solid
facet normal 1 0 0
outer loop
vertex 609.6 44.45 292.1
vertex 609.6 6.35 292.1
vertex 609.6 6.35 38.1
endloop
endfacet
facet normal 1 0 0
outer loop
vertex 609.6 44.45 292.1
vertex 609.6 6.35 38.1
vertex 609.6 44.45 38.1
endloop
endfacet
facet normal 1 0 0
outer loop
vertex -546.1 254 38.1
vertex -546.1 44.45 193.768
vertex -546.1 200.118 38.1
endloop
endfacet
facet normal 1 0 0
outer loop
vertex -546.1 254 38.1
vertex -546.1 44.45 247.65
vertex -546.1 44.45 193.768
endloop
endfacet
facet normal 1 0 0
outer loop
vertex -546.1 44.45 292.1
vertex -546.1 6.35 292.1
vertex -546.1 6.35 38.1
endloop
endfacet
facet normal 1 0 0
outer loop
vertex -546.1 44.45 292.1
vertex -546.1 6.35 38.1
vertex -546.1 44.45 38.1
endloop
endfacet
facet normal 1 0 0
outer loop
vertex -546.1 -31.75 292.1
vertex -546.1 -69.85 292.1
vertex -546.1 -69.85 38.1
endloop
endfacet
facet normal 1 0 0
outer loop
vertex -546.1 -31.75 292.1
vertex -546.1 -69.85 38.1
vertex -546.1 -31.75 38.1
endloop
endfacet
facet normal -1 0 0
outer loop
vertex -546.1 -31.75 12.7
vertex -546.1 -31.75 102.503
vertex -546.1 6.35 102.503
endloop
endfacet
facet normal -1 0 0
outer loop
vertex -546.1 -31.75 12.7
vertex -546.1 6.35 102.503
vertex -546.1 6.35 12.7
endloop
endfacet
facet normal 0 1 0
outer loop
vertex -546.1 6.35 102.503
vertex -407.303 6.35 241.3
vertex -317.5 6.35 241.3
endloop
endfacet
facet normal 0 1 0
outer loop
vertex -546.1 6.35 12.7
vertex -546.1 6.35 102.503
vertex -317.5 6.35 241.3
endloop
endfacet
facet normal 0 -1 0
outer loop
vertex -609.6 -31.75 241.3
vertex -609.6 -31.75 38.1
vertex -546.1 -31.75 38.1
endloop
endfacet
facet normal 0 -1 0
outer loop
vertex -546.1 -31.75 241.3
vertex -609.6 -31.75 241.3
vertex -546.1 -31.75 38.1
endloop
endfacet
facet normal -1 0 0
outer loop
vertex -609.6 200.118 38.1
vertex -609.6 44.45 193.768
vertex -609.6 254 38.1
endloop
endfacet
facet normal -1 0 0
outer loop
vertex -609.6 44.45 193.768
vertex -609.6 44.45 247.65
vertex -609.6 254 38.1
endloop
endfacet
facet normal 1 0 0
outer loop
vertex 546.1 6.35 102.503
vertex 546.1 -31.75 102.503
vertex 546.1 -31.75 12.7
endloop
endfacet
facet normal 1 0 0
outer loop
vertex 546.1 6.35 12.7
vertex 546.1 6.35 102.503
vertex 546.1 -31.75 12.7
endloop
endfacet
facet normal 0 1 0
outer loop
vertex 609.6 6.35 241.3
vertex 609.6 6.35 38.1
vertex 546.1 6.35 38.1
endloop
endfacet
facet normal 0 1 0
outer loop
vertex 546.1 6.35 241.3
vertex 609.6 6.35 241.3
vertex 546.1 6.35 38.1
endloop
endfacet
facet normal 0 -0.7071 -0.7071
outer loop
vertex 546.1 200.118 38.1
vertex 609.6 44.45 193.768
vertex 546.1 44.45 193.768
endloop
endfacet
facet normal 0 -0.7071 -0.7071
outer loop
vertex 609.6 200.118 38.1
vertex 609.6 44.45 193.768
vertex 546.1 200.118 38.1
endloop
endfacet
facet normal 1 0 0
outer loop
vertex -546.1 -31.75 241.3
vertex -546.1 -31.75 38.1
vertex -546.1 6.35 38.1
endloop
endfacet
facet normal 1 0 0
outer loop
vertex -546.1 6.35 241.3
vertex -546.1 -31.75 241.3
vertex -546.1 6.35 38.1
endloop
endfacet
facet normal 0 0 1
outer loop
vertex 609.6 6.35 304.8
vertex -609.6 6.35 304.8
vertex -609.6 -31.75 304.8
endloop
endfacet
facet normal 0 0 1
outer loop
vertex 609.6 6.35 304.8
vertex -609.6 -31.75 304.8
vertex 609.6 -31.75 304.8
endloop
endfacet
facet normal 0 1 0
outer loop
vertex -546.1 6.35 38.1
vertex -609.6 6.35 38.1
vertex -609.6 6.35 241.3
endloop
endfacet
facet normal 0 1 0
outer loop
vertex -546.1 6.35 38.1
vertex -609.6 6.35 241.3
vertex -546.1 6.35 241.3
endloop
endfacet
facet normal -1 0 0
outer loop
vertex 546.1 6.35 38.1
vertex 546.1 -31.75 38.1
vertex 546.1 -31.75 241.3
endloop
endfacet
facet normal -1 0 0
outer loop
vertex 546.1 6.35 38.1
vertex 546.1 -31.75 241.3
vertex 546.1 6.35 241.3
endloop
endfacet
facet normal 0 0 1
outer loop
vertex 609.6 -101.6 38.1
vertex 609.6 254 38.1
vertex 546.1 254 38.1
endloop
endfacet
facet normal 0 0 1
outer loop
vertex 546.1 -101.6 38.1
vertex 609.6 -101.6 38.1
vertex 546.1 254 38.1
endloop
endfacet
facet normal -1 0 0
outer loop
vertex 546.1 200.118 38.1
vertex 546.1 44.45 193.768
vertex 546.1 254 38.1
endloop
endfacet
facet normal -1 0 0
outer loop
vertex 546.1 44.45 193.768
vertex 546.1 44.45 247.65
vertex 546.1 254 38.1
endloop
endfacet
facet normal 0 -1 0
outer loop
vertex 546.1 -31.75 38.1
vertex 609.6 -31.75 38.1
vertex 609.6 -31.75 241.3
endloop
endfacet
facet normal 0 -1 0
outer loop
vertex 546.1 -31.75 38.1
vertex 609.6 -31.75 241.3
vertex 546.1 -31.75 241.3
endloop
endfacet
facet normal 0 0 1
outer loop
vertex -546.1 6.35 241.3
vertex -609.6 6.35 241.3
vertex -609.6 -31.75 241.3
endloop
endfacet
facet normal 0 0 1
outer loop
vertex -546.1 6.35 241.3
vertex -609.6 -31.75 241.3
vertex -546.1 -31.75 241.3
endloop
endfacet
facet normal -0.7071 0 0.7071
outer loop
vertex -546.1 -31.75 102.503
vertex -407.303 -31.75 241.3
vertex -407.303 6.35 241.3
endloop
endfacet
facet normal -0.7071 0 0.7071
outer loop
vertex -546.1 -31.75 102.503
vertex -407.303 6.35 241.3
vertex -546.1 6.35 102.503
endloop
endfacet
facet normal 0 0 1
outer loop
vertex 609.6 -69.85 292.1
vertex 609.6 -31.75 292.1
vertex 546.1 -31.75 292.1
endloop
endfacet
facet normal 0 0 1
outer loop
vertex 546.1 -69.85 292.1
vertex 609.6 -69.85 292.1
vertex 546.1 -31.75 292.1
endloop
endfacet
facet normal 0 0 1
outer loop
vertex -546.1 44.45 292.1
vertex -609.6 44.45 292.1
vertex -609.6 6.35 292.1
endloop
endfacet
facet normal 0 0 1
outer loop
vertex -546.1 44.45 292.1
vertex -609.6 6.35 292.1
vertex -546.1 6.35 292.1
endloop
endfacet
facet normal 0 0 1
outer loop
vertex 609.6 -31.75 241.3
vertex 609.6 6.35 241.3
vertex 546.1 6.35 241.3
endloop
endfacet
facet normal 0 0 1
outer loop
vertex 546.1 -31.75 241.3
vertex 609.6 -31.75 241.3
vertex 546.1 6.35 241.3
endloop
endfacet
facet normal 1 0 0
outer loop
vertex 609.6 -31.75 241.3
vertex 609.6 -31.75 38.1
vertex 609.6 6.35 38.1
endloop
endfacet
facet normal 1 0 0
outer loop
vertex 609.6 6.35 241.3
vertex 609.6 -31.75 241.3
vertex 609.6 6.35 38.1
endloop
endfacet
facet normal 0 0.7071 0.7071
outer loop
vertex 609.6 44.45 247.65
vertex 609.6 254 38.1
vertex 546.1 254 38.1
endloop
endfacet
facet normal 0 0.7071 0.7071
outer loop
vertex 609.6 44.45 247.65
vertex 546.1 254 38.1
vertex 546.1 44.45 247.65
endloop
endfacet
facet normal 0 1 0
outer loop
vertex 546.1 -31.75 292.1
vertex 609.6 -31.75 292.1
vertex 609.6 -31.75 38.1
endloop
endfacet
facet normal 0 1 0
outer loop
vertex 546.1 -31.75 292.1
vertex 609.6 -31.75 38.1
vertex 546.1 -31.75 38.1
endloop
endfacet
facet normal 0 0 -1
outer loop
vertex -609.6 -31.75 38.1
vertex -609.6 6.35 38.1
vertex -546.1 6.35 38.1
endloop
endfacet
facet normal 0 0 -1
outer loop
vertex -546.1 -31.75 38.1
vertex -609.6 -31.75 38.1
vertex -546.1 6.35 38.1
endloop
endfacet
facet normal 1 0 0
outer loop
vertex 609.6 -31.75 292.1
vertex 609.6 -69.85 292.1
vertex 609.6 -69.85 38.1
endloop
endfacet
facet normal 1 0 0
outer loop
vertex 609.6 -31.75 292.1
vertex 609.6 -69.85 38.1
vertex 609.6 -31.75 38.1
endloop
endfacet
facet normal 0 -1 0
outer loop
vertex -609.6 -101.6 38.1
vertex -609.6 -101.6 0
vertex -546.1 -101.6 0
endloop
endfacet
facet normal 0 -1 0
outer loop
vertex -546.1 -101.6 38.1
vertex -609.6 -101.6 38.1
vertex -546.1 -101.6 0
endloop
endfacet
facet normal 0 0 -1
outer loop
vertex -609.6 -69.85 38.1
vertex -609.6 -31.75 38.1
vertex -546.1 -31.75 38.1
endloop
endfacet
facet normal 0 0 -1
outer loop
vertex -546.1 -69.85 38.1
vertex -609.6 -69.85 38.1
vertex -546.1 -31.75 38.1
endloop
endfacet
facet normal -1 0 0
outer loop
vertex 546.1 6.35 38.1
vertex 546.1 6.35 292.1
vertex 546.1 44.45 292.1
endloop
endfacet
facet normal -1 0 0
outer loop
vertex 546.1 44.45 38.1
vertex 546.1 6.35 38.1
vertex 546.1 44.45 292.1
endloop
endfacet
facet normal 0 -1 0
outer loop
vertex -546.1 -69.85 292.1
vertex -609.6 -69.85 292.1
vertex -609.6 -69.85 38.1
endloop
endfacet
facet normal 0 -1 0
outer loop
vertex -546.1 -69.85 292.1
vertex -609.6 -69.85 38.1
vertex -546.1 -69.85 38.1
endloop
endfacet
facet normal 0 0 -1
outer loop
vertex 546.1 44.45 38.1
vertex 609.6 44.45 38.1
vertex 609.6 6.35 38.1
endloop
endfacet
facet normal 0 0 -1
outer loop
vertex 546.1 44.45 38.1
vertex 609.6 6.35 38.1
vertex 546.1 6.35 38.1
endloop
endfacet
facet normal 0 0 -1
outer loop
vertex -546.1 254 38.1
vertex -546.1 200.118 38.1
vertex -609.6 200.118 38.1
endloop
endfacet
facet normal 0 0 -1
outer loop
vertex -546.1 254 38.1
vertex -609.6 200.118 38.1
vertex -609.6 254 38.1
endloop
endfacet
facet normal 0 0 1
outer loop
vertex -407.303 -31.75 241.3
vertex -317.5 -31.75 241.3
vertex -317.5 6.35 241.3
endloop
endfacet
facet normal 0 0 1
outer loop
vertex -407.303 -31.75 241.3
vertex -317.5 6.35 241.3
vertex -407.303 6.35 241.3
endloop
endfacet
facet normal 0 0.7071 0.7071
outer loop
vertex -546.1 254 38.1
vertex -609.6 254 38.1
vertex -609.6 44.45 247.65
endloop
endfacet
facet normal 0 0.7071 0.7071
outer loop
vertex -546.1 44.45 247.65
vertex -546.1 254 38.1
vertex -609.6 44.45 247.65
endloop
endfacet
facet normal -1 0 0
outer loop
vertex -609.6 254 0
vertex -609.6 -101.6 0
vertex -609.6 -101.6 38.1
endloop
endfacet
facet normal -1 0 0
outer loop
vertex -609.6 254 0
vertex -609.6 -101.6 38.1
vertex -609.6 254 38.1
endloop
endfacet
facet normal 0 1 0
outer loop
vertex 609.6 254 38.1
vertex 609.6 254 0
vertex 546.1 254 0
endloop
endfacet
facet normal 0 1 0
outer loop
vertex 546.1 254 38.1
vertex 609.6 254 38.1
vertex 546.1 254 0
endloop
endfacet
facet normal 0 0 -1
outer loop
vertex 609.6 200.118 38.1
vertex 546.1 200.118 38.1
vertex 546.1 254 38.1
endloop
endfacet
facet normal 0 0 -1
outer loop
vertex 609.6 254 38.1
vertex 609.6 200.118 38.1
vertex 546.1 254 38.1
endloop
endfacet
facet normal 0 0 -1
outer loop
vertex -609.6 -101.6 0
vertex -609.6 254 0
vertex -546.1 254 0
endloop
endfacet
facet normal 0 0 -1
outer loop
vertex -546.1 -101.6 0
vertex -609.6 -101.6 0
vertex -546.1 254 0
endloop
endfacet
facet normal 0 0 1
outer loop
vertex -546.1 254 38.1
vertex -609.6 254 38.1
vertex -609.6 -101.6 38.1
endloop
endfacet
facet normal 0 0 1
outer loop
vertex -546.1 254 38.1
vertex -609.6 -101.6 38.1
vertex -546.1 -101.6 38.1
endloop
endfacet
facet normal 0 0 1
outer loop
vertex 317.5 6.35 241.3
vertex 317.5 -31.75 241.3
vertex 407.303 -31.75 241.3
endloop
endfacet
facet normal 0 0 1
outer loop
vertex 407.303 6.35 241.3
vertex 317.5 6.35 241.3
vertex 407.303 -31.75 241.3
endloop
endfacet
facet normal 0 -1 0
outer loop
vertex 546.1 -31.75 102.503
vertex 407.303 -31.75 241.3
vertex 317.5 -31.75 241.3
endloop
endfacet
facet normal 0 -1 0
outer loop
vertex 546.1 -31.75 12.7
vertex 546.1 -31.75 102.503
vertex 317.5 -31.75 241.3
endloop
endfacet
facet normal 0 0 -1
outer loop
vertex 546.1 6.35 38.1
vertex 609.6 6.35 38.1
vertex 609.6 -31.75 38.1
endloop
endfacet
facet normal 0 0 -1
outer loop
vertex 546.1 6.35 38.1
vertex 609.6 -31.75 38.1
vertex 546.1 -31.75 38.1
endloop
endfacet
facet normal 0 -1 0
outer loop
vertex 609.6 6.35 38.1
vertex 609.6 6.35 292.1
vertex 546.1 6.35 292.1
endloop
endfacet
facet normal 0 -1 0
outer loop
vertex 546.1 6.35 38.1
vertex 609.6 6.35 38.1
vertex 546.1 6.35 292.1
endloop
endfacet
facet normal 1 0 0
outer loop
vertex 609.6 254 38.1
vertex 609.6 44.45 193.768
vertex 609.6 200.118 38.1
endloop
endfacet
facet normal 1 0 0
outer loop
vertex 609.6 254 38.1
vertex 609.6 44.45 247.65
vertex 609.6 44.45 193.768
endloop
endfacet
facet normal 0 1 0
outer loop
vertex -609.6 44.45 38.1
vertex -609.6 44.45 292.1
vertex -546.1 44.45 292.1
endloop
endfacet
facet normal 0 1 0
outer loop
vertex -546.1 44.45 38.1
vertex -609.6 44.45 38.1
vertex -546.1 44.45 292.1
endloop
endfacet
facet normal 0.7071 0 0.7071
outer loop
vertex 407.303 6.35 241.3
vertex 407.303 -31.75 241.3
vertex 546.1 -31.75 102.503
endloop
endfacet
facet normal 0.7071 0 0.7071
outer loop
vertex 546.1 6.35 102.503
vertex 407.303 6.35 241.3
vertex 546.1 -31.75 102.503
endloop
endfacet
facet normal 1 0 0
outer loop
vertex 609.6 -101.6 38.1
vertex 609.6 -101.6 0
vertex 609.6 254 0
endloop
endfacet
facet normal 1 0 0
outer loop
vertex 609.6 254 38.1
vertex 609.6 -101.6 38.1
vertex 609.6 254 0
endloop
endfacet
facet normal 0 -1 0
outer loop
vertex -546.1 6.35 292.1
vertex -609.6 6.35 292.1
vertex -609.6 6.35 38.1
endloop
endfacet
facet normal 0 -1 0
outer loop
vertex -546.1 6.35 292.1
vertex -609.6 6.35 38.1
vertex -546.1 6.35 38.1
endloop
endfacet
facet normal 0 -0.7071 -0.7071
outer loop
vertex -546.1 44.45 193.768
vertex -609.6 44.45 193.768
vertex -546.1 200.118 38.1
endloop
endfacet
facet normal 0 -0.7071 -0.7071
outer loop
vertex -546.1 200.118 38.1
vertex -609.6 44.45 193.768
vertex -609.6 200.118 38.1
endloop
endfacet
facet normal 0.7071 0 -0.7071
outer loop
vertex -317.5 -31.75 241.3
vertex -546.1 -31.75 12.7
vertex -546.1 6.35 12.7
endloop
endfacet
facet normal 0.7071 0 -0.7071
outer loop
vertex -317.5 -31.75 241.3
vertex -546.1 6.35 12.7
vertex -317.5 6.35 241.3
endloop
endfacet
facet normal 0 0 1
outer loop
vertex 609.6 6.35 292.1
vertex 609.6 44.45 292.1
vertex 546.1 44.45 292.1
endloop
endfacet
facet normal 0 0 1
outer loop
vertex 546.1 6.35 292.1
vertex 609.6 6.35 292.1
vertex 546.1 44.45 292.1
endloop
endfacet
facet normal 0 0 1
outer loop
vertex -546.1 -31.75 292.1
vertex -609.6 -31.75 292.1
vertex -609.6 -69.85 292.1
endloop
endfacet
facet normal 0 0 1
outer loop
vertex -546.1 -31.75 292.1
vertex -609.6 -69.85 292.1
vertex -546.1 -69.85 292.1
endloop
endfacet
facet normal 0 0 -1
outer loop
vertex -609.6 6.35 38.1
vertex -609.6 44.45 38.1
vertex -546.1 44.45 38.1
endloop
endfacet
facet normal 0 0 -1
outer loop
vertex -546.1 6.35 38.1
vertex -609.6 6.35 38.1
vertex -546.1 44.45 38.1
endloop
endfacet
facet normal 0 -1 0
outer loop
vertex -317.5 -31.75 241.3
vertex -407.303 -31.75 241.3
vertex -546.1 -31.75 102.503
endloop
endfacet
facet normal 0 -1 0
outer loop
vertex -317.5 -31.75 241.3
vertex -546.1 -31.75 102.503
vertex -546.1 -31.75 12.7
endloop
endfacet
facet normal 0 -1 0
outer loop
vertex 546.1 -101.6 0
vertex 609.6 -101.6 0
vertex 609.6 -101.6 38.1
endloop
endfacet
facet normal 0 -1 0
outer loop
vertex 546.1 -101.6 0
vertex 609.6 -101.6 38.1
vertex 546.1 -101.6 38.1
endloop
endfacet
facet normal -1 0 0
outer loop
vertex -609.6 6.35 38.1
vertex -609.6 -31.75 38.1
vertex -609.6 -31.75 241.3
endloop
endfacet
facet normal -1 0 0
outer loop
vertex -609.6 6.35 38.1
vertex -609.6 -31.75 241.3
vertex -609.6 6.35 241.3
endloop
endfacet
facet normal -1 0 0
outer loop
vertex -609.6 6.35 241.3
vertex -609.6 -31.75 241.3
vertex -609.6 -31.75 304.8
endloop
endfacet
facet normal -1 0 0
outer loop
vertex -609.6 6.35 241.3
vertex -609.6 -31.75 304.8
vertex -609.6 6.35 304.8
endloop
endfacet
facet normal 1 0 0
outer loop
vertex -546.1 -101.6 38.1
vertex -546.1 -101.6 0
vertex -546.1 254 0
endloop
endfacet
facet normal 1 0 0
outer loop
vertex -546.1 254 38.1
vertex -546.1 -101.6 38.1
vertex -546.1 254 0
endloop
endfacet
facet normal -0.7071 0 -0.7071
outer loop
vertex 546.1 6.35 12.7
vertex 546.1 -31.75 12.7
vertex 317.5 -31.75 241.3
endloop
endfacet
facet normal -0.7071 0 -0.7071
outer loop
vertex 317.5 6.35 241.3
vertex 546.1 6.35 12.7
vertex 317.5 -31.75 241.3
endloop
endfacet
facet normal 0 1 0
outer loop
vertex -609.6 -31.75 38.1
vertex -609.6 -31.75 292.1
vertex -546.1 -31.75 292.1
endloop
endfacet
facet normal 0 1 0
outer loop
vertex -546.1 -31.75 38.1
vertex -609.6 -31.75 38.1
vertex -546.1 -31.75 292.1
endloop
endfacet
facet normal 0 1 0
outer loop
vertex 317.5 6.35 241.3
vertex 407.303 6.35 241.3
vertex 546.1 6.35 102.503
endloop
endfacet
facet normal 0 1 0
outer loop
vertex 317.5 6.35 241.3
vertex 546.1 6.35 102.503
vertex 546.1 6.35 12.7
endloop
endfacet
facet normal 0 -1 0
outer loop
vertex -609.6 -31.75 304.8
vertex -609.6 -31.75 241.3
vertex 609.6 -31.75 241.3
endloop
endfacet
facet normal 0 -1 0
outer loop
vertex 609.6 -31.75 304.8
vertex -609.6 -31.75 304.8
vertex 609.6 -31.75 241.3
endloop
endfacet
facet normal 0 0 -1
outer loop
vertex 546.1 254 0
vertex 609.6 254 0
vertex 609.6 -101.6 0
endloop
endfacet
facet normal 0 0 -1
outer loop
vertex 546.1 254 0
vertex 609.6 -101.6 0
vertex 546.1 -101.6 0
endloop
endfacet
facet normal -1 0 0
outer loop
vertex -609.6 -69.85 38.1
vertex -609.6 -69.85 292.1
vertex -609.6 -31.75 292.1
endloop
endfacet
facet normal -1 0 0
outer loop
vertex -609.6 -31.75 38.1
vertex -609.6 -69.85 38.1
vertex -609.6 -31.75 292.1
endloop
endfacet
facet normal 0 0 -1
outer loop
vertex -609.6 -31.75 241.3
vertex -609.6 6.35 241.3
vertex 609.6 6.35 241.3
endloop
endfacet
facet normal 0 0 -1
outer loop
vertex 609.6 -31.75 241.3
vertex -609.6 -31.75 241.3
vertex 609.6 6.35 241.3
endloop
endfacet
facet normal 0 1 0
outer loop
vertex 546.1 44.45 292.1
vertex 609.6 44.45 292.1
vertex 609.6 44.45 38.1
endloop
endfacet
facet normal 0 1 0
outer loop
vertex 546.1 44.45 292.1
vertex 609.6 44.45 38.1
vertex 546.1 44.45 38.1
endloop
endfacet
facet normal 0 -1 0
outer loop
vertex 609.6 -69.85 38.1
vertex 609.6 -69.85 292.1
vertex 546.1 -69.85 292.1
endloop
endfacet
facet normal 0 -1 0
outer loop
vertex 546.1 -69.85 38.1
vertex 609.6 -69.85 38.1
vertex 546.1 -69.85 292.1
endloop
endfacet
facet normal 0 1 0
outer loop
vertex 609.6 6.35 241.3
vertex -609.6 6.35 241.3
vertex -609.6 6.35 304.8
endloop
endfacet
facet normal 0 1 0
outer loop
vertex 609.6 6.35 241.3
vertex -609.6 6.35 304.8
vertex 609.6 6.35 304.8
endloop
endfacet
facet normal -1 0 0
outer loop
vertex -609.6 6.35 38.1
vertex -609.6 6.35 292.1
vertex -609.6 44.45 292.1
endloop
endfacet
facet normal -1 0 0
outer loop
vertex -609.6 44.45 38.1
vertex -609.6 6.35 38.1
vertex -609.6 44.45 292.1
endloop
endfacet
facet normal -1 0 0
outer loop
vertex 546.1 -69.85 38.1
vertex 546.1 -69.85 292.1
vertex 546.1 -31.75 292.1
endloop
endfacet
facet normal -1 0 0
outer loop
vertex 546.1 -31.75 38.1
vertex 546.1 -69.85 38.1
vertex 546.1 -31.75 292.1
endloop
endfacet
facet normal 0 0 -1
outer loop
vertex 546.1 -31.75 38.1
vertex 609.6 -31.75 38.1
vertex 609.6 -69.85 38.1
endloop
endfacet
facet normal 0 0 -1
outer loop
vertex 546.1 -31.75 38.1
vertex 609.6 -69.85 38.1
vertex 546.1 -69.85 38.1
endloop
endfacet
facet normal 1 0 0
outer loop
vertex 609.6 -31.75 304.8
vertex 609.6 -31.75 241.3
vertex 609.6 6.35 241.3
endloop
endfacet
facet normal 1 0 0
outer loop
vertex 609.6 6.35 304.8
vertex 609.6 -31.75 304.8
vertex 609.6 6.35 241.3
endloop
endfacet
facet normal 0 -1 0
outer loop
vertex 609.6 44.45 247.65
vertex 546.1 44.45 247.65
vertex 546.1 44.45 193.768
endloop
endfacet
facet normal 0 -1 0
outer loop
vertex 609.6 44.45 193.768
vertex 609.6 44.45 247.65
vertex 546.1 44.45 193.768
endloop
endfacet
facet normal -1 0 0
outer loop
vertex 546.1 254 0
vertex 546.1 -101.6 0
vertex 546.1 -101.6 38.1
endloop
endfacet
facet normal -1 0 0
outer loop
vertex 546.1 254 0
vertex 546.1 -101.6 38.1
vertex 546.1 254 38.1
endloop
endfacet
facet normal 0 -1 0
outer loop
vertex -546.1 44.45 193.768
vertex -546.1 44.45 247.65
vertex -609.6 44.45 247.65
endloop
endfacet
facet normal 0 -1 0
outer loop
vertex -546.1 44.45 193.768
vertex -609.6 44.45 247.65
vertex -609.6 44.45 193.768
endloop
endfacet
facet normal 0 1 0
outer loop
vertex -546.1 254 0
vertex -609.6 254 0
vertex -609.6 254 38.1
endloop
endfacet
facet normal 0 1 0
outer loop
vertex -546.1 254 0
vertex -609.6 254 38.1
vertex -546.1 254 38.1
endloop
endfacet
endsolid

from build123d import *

# Parameters (mm, degrees)
F1_W      = 63.5
F1_H      = 355.6
F2_DEPTH  = 38.1
F3_W      = 63.5
F3_H      = 38.1
F4_DEPTH  = 203.2
F6_W      = 1219.2
F6_H      = 38.1
F7_DEPTH  = 63.5
F9_DEPTH  = 38.1
F11_W     = 63.5
F11_H     = 38.1
F12_DEPTH = 254
F15_DEPTH = 63.5


# Not quite as in the source:
# - a variable given as a bare number and used for a length is read in inches; the dataset says mm whatever the document's units were


with BuildPart() as f2:
    # F1 (on Top) → F2 (new body)
    with BuildSketch(Plane.XY):
        with Locations((-577.85, 76.2)):
            Rectangle(F1_W, F1_H)
    extrude(amount=F2_DEPTH)


with BuildPart() as f4:
    # F3 (on face) → F4 (new body)
    with BuildSketch(Plane.XY.offset(38.1)):
        with Locations((-577.85, -12.7)):
            Rectangle(F3_W, F3_H)
    extrude(amount=F4_DEPTH)


with BuildPart() as f5_1:
    # F5: instance of F4
    add(f4.part.mirror(Plane.YZ))


with BuildPart() as f5_2:
    # F5: instance of F2
    add(f2.part.mirror(Plane.YZ))


with BuildPart() as f7:
    # F6 (on face) → F7 (new body)
    with BuildSketch(Plane.XY.offset(241.3)):
        with Locations((0, -12.7)):
            Rectangle(F6_W, F6_H)
    extrude(amount=F7_DEPTH)


with BuildPart() as f9:
    # F8 (on face) → F9 (new body)
    with BuildSketch(Plane.XZ.offset(31.75)):
        Polygon((-407.3025612107, 241.3), (-546.1, 102.5025612107), (-546.1, 12.7), (-317.5, 241.3), align=None)
    extrude(amount=-F9_DEPTH)


with BuildPart() as f10_1:
    # F10: instance of F9
    add(f9.part.mirror(Plane.YZ))


with BuildPart() as f12:
    # F11 (on face) → F12 (new body)
    with BuildSketch(Plane.XY.offset(38.1)):
        with Locations((-577.85, -50.8)):
            Rectangle(F11_W, F11_H)
    extrude(amount=F12_DEPTH)


with BuildPart() as f12b:
    # F11 (on face) → F12, piece 2 (new body)
    with BuildSketch(Plane.XY.offset(38.1)):
        with Locations((-577.85, 25.4)):
            Rectangle(F11_W, F11_H)
    extrude(amount=F12_DEPTH)


with BuildPart() as f13_1:
    # F13: instance of F12b
    add(f12b.part.mirror(Plane.YZ))


with BuildPart() as f13_2:
    # F13: instance of F12
    add(f12.part.mirror(Plane.YZ))


with BuildPart() as f15:
    # F14 (on face) → F15 (new body)
    with BuildSketch(Plane.YZ.offset(609.6)):
        Polygon((44.45, 193.7684632736), (200.1184632736, 38.1), (254, 38.1), (44.45, 247.65), align=None)
    extrude(amount=-F15_DEPTH)


with BuildPart() as f16_1:
    # F16: instance of F15
    add(f15.part.mirror(Plane.YZ))


solid = Compound([f2.part, f4.part, f5_1.part, f5_2.part, f7.part, f9.part, f10_1.part, f12.part, f12b.part, f13_1.part, f13_2.part, f15.part, f16_1.part])
